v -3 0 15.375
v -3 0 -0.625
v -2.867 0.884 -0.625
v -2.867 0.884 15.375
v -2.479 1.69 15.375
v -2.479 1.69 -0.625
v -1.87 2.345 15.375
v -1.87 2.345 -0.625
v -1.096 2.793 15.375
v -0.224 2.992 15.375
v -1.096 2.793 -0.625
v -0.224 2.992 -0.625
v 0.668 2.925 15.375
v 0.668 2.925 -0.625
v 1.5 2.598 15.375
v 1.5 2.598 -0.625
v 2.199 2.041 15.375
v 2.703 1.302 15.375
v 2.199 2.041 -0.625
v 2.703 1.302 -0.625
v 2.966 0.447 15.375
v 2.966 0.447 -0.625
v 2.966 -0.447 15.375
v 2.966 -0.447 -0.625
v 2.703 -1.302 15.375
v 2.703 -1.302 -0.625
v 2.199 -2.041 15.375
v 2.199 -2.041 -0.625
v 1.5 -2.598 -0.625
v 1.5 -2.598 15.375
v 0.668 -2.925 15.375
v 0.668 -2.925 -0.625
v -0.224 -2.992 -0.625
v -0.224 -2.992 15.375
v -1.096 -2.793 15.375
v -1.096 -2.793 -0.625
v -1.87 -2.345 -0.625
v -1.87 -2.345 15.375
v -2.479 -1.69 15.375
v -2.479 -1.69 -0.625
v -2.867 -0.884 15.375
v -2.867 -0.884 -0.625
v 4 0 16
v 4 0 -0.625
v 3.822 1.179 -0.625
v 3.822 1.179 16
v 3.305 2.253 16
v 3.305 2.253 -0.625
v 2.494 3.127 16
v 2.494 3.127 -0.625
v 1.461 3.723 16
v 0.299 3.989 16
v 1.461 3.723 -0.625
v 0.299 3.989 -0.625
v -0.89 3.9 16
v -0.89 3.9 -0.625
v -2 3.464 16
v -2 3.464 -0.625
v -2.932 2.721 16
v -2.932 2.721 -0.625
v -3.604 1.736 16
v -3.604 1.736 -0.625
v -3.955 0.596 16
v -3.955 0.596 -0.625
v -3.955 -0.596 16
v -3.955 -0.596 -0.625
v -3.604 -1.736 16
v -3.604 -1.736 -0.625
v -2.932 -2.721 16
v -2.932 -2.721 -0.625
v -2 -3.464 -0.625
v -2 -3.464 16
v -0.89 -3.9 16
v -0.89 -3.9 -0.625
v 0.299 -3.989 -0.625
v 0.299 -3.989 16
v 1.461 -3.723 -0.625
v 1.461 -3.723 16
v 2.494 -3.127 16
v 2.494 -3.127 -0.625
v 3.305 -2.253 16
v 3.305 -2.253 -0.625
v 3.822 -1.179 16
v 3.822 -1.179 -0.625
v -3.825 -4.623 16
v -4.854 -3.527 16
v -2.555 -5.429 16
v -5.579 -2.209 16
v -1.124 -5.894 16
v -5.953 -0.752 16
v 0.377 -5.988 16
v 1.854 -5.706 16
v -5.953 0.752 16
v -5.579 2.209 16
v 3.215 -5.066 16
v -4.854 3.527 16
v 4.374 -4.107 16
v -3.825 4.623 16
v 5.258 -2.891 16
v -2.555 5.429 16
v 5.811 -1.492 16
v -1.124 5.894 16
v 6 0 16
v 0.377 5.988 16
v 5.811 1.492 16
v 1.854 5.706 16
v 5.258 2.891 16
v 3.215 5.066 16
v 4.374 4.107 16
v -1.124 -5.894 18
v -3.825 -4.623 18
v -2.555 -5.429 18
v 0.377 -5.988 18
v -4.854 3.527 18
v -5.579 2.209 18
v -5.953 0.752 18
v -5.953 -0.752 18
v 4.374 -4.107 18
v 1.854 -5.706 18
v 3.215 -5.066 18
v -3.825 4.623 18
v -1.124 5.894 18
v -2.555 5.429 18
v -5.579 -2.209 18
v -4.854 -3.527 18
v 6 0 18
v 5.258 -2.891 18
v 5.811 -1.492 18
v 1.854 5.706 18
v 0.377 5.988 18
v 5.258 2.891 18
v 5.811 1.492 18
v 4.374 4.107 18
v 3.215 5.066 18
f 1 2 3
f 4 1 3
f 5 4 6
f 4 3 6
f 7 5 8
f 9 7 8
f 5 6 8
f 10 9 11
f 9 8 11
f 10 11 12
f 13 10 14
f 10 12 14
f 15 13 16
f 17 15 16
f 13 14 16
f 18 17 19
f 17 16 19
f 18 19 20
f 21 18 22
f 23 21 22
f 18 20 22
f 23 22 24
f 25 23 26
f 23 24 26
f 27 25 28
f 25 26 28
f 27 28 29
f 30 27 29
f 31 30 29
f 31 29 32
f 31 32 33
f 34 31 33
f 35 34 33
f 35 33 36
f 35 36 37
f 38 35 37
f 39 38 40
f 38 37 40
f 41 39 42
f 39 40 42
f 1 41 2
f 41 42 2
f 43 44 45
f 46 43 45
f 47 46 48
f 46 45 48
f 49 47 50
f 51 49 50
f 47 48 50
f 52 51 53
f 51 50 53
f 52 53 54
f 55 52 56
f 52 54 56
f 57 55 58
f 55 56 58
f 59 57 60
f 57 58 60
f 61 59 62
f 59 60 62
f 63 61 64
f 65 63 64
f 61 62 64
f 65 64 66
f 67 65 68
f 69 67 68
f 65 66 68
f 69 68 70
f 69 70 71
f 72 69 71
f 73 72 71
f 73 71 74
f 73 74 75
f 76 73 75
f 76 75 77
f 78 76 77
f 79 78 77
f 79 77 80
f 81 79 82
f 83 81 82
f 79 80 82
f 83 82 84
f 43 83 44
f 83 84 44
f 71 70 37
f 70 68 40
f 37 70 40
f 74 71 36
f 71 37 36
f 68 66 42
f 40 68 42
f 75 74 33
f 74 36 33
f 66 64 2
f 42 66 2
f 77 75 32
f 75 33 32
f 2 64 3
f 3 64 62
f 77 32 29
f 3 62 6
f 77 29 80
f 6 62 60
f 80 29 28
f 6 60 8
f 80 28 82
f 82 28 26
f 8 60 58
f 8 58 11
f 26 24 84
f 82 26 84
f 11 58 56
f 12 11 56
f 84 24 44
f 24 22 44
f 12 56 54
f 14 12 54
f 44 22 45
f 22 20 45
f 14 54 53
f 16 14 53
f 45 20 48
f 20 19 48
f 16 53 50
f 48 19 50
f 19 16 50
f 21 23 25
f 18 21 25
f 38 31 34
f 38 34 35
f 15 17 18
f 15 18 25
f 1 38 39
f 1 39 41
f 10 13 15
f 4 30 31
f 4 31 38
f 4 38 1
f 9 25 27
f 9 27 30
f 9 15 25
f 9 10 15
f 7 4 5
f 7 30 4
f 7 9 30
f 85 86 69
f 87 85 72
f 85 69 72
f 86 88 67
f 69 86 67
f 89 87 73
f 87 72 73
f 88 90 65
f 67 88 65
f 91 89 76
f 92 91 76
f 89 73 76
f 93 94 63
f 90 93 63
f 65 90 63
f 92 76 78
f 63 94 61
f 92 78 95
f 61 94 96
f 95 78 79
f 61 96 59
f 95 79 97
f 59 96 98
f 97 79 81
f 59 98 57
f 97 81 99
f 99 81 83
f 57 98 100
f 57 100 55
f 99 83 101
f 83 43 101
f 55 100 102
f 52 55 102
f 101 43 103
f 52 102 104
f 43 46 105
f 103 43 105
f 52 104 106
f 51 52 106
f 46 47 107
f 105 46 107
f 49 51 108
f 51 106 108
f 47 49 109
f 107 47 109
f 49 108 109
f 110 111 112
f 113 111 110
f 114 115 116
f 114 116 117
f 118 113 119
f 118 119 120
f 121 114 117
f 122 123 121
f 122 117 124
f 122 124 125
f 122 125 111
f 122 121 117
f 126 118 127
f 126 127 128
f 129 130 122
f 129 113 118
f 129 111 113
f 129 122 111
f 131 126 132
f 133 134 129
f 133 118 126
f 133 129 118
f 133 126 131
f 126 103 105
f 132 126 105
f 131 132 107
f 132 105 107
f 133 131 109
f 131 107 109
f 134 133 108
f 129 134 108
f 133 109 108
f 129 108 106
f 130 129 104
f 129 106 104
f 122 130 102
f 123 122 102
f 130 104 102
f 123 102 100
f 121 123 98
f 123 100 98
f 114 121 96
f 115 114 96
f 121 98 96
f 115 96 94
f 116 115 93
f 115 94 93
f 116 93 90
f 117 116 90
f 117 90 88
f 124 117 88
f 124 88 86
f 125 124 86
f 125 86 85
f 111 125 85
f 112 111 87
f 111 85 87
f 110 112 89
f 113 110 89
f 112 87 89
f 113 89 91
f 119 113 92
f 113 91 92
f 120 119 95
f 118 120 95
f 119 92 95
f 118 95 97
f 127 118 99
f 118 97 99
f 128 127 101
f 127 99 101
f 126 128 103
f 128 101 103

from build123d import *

# Parameters (mm, degrees)
BOSS_EXTRUDE4_DEPTH      = 16
BOSS_EXTRUDE4_DEPTH_BACK = 0.625401596
SKETCH2_R                = 4
SKETCH4_R                = 6
BOSS_EXTRUDE5_DEPTH      = 2
SKETCH5_R                = 3
CUT_EXTRUDE1_DEPTH       = 16


with BuildPart() as part:
    # Sketch2 → Boss-Extrude4 (new, two sides: drawn at the far end of the back side and taken through both)
    with BuildSketch(Plane.XY.offset(-BOSS_EXTRUDE4_DEPTH_BACK)):
        Circle(SKETCH2_R)
    extrude(amount=BOSS_EXTRUDE4_DEPTH + BOSS_EXTRUDE4_DEPTH_BACK)

    # Sketch4 → Boss-Extrude5 (add)
    with BuildSketch(Plane.XY.offset(16)):
        Circle(SKETCH4_R)
    extrude(amount=BOSS_EXTRUDE5_DEPTH)

    # Sketch5 → Cut-Extrude1 (cut)
    with BuildSketch(Plane(origin=(0, 0, -0.625401596), x_dir=(-1, 0, 0), z_dir=(0, 0, -1))):
        Circle(SKETCH5_R)
    extrude(amount=-CUT_EXTRUDE1_DEPTH, mode=Mode.SUBTRACT)


solid = part.part
